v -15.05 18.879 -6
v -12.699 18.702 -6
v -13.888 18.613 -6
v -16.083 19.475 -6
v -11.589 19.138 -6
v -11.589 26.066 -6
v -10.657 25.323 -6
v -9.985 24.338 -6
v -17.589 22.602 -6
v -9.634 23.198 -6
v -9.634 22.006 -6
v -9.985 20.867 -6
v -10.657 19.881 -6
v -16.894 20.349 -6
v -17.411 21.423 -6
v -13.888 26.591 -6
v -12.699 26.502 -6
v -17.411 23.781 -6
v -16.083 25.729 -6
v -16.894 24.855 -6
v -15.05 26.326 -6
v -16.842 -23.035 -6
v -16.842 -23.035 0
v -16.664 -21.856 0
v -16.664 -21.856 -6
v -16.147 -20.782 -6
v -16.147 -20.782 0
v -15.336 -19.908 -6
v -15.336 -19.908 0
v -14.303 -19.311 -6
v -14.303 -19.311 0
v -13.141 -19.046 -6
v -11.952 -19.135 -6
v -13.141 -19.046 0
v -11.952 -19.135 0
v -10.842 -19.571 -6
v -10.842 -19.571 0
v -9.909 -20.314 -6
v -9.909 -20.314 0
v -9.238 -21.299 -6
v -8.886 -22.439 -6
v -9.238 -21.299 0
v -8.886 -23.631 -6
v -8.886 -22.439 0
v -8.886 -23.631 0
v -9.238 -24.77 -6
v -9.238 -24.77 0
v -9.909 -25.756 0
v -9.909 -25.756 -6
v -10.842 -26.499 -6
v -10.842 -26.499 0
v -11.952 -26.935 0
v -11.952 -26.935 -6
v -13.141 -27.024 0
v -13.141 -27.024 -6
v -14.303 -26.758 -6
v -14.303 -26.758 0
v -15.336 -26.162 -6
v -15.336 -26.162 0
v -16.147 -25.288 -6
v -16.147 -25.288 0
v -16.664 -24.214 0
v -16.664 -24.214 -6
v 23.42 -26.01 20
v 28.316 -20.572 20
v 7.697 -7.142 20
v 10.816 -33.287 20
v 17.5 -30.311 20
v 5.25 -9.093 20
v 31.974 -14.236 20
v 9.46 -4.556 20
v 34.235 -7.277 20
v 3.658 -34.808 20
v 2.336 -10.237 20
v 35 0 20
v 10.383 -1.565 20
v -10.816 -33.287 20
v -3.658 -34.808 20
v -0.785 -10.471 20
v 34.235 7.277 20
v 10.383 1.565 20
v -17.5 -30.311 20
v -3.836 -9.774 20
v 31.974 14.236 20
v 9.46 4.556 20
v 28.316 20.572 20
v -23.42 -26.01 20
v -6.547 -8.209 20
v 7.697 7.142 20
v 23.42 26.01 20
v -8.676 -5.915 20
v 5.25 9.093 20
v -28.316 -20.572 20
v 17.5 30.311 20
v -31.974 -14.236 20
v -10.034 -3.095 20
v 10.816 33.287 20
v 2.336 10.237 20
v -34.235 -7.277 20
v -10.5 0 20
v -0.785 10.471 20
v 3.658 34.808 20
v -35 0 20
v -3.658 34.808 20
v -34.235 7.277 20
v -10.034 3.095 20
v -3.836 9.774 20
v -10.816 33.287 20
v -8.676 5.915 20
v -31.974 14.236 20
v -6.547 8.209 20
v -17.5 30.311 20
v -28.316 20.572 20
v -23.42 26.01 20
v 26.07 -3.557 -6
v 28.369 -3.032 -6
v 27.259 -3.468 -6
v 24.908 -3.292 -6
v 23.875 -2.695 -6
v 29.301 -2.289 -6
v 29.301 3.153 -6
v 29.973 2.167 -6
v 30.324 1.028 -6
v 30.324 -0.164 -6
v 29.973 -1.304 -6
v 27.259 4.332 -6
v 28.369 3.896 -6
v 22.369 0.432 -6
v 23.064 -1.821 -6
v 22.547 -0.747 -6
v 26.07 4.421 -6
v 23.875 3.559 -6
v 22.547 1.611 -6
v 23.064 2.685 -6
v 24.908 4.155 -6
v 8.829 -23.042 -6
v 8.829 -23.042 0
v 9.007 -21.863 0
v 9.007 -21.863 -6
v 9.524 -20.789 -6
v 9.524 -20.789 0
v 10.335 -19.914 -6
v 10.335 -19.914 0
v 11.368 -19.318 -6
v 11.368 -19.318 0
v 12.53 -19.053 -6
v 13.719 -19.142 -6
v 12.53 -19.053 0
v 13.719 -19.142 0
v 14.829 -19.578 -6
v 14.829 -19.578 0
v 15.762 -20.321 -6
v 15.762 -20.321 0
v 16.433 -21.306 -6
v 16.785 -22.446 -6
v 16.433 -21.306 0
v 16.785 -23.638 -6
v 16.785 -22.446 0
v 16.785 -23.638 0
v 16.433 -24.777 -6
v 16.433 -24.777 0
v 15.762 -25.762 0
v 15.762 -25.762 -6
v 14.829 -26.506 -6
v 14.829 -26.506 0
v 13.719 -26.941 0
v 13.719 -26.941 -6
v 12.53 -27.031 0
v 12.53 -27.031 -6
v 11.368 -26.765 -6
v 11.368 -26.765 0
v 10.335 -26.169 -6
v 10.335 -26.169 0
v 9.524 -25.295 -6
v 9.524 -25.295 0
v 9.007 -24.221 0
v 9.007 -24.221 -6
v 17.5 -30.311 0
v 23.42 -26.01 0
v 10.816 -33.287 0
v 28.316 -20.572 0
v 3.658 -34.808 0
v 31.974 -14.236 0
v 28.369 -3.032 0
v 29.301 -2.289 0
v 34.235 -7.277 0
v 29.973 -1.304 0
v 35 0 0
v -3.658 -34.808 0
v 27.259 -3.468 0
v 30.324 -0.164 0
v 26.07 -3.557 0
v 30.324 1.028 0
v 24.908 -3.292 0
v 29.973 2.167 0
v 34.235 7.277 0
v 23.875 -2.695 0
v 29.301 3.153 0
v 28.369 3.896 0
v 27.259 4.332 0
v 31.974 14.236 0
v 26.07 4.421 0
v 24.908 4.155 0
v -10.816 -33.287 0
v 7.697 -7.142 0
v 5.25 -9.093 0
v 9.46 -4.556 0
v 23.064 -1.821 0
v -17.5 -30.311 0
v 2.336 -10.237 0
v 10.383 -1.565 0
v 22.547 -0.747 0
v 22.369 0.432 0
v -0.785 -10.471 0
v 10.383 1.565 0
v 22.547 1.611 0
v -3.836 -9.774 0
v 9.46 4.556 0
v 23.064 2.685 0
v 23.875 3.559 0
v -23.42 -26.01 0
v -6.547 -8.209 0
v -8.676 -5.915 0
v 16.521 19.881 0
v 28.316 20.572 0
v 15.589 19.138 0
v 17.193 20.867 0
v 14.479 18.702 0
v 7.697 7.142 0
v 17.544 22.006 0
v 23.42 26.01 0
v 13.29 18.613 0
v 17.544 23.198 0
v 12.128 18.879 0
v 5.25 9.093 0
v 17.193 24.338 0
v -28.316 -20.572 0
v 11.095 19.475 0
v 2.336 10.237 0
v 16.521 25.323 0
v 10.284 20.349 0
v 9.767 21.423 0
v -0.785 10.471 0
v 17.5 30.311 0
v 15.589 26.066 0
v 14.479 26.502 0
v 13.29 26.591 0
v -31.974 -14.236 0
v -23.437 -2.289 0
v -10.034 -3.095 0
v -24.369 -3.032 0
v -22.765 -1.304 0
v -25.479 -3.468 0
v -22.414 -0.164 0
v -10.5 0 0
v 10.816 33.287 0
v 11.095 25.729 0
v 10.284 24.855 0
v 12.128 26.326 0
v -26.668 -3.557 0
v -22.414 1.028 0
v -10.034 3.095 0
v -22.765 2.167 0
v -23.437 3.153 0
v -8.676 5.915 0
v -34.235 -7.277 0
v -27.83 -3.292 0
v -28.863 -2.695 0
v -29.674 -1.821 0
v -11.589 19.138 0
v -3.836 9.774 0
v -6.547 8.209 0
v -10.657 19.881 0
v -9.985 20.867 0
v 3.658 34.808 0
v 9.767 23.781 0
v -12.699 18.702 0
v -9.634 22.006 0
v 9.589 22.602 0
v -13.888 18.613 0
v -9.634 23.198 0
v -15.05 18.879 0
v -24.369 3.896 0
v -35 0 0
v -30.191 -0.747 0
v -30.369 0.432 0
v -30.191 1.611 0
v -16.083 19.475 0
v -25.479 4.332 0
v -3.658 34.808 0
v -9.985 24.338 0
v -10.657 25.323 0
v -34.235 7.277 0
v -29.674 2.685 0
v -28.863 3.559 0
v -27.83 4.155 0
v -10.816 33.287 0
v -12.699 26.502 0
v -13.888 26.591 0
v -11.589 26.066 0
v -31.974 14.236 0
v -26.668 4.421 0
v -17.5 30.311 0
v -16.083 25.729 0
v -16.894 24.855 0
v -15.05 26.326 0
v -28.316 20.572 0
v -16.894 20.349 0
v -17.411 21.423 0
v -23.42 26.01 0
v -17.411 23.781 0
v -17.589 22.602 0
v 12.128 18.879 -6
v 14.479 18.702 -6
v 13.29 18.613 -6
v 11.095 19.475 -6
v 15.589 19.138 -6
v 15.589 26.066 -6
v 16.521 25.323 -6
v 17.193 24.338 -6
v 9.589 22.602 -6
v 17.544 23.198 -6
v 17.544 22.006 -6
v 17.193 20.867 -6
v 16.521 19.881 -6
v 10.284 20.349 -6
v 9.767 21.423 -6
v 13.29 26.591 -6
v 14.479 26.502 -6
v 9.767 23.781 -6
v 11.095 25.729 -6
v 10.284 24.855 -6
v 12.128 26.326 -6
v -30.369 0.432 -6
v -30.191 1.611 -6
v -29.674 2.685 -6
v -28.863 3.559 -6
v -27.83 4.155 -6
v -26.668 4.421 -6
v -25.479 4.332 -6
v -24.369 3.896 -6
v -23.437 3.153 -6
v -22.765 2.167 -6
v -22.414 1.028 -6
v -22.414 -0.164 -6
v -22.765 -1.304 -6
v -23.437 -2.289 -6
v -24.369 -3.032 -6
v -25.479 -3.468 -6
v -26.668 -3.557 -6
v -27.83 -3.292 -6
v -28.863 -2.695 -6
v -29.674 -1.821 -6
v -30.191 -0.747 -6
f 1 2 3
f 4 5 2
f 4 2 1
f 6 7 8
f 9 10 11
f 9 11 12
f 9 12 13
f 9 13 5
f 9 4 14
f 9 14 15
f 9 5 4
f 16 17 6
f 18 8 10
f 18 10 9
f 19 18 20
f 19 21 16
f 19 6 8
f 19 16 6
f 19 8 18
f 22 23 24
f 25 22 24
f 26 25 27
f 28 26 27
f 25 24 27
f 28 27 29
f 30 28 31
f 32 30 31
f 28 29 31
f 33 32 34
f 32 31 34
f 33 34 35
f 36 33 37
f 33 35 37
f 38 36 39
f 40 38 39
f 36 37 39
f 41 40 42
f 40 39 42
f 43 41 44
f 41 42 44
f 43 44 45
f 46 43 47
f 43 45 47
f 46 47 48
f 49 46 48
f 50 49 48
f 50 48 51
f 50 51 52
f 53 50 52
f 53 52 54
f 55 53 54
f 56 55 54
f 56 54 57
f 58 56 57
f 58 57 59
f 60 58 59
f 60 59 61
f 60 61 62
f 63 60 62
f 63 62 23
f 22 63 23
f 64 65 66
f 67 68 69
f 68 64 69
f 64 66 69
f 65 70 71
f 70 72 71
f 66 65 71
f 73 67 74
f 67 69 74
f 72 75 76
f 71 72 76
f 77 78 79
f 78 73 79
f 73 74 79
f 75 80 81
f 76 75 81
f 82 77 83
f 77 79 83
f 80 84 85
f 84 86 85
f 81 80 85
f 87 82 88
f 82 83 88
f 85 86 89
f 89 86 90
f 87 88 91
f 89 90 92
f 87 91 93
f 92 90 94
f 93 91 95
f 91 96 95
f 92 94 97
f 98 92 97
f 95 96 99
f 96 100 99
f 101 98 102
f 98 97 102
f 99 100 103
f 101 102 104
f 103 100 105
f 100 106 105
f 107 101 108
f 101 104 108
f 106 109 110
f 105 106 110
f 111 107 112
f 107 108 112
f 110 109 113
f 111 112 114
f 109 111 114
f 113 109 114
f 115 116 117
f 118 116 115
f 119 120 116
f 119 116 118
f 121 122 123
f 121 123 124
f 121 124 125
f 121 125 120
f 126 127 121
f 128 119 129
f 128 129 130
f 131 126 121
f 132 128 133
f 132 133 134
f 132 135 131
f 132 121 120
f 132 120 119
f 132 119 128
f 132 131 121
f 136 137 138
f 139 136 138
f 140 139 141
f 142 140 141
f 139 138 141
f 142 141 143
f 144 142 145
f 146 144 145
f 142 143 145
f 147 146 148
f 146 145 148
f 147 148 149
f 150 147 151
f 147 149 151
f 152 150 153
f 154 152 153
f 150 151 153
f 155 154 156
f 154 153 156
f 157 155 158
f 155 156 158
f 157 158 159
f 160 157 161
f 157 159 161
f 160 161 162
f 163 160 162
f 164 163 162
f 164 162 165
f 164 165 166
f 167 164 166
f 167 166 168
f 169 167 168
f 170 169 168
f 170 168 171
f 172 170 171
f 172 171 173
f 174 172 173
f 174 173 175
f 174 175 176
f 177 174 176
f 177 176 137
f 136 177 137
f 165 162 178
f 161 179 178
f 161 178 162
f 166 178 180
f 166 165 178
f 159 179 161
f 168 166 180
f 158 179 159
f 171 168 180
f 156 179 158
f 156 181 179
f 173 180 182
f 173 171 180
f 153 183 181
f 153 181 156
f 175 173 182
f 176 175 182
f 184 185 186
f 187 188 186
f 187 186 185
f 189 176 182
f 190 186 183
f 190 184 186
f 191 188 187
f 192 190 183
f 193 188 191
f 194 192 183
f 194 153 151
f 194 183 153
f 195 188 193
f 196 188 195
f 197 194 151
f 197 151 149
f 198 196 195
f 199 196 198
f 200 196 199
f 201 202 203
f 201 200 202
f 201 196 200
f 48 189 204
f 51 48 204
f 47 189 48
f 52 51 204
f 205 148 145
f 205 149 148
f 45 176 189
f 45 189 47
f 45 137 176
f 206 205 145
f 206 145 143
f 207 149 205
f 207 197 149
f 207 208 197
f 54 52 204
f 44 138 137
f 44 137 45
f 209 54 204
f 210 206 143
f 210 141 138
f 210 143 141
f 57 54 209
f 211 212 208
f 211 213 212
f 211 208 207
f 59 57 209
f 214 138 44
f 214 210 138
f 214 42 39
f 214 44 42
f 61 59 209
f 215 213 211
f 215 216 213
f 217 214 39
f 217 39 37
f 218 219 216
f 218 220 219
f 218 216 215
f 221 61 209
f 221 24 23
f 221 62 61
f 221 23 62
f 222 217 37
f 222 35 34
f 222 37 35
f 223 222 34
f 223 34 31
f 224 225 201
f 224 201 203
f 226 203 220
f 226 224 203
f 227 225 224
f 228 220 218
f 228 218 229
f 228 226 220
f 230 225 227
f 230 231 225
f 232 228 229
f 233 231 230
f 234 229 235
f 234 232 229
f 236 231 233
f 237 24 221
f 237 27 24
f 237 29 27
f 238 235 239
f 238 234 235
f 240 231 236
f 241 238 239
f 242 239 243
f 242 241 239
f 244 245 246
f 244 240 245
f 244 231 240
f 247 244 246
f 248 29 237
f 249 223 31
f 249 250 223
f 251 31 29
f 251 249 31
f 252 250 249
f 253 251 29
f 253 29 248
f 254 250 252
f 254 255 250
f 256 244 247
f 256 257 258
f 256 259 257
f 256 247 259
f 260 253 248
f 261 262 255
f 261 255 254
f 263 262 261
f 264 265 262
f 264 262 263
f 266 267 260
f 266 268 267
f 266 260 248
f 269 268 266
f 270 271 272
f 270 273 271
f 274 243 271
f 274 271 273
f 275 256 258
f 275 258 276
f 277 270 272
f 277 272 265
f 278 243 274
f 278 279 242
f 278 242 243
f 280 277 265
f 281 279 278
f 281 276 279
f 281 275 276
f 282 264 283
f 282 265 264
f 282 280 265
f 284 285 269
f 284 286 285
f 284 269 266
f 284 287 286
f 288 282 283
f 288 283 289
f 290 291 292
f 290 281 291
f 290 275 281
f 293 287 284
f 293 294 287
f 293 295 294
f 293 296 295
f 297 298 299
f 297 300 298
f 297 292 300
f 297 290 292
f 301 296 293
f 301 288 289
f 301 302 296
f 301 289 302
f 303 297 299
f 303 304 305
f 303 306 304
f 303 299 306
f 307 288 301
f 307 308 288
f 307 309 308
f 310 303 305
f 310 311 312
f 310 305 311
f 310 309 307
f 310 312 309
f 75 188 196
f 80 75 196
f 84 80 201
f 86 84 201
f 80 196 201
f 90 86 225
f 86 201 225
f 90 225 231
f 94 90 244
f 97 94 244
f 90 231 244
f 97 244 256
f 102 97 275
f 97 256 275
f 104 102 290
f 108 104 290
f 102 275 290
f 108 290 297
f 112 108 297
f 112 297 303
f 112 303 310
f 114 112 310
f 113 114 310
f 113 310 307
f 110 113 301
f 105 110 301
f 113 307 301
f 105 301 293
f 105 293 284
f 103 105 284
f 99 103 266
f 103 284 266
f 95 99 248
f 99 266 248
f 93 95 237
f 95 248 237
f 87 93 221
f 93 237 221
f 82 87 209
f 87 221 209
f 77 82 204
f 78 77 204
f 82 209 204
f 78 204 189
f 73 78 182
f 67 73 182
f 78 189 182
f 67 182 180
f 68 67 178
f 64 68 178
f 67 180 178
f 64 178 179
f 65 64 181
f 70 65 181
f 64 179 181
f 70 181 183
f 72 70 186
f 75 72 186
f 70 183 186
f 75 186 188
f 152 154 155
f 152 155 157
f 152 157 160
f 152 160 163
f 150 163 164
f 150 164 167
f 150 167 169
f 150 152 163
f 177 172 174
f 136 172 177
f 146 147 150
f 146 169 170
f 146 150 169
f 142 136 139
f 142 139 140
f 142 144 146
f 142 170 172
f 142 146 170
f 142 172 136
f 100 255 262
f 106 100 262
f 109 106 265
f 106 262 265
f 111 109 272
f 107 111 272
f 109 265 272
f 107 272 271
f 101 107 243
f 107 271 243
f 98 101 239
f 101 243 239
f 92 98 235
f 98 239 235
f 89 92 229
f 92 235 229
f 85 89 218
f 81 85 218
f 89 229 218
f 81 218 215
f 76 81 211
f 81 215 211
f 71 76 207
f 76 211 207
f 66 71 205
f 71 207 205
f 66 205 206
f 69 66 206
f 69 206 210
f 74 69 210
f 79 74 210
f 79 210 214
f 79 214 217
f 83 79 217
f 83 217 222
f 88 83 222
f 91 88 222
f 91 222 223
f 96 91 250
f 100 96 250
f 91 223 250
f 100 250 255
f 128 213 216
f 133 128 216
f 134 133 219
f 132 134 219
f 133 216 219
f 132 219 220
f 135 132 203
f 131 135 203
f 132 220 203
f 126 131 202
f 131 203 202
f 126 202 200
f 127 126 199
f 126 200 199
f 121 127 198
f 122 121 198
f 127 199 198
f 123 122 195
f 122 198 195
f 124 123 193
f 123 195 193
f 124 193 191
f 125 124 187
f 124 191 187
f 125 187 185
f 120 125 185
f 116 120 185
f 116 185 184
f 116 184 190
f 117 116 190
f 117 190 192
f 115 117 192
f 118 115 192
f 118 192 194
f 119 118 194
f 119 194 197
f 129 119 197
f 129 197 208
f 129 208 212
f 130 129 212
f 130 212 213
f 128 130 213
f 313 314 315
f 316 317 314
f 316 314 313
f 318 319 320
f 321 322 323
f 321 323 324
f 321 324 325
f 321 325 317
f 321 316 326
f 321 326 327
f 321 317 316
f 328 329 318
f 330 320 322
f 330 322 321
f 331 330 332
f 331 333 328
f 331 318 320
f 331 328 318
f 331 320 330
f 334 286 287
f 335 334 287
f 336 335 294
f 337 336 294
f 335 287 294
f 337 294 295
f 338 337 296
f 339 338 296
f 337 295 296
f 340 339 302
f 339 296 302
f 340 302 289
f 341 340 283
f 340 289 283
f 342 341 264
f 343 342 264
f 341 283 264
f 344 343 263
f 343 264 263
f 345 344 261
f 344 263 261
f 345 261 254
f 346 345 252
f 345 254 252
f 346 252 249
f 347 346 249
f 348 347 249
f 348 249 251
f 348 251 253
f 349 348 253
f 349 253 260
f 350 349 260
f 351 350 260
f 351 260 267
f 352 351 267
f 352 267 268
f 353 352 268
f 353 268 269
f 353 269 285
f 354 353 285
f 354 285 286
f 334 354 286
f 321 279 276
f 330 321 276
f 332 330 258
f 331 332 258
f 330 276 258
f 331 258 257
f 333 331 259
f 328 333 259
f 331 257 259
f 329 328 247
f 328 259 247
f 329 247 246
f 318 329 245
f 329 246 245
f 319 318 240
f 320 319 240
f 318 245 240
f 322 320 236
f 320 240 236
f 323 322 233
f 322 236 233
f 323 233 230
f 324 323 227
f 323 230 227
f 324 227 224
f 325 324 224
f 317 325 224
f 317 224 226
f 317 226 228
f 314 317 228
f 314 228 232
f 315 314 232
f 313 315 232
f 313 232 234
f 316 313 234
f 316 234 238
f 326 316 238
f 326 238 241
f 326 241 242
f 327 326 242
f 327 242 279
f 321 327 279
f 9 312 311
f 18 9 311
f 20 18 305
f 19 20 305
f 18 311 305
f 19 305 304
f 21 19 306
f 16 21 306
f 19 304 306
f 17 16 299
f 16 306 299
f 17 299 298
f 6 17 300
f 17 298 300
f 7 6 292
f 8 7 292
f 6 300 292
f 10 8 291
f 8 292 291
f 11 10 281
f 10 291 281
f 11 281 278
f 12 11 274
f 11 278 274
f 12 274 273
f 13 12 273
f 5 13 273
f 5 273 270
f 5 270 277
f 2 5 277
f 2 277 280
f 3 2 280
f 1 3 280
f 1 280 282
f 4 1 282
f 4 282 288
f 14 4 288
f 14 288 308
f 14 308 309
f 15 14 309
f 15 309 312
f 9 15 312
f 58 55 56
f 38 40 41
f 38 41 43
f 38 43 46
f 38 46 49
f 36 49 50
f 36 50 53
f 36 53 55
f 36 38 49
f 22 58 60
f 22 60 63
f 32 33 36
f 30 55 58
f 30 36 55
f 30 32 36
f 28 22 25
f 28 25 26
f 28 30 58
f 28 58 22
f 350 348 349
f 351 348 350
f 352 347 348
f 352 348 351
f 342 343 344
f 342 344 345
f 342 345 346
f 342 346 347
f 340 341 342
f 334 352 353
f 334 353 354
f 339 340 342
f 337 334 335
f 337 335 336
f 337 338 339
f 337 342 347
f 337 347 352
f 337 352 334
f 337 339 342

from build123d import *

# Parameters (mm, degrees)
ESQUISSE1_R             = 35
ESQUISSE1_R_2           = 7
BOSS_EXTRU_1_DEPTH      = 20
ESQUISSE2_R             = 14
ENL_V_MAT_EXTRU_1_DEPTH = 5
ESQUISSE3_R             = 4
ENL_V_MAT_EXTRU_3_DEPTH = 5
ESQUISSE8_R             = 14
ENL_V_MAT_EXTRU_4_DEPTH = 25
BOSS_EXTRU_2_DEPTH      = 6
BOSS_EXTRU_2_DEPTH_BACK = 9
ESQUISSE9_R             = 4
ESQUISSE10_R            = 14
ESQUISSE10_R_2          = 10.5
BOSS_EXTRU_3_DEPTH      = 20


with BuildPart() as part:
    # Esquisse1 → Boss.-Extru.1 (new body)
    with BuildSketch(Plane.XY):
        Circle(ESQUISSE1_R)
        Circle(ESQUISSE1_R_2, mode=Mode.SUBTRACT)
    extrude(amount=BOSS_EXTRU_1_DEPTH)

    # Esquisse2 → Enlèv. mat.-Extru.1 (cut)
    with BuildSketch(Plane(origin=(0, 0, 0), x_dir=(-1, 0, 0), z_dir=(0, 0, -1))):
        Circle(ESQUISSE2_R)
    extrude(amount=-ENL_V_MAT_EXTRU_1_DEPTH, mode=Mode.SUBTRACT)

    # Esquisse3 → Enlèv. mat.-Extru.3 (cut)
    with BuildSketch(Plane(origin=(0, 0, 0), x_dir=(-1, 0, 0), z_dir=(0, 0, -1))):
        with Locations((-13.588993608, 22.602101614)):
            Circle(ESQUISSE3_R)
        with Locations((13.588993608, 22.602101614)):
            Circle(ESQUISSE3_R)
        with Locations((26.369096609, 0.431843358)):
            Circle(ESQUISSE3_R)
        with Locations((12.841601354, -23.034952123)):
            Circle(ESQUISSE3_R)
        with Locations((-12.82933858, -23.041784138)):
            Circle(ESQUISSE3_R)
        with Locations((-26.369096609, 0.431843358)):
            Circle(ESQUISSE3_R)
    extrude(amount=-ENL_V_MAT_EXTRU_3_DEPTH, mode=Mode.SUBTRACT)

    # Esquisse8 → Enlèv. mat.-Extru.4 (cut)
    with BuildSketch(Plane(origin=(0, 0, 0), x_dir=(-1, 0, 0), z_dir=(0, 0, -1))):
        Circle(ESQUISSE8_R)
    extrude(amount=-ENL_V_MAT_EXTRU_4_DEPTH, mode=Mode.SUBTRACT)

    # Esquisse9 → Boss.-Extru.2 (add, two sides: drawn at the far end of the back side and taken through both)
    with BuildSketch(Plane(origin=(0, 0, 0), x_dir=(-1, 0, 0), z_dir=(0, 0, -1)).offset(-BOSS_EXTRU_2_DEPTH_BACK)):
        with Locations((-13.588993608, 22.602101614)):
            Circle(ESQUISSE9_R)
        with Locations((13.588993608, 22.602101614)):
            Circle(ESQUISSE9_R)
        with Locations((26.369096609, 0.431843358)):
            Circle(ESQUISSE9_R)
        with Locations((12.841601354, -23.034952123)):
            Circle(ESQUISSE9_R)
        with Locations((-12.82933858, -23.041784138)):
            Circle(ESQUISSE9_R)
        with Locations((-26.369096609, 0.431843358)):
            Circle(ESQUISSE9_R)
    extrude(amount=BOSS_EXTRU_2_DEPTH + BOSS_EXTRU_2_DEPTH_BACK)

    # Esquisse10 → Boss.-Extru.3 (add)
    with BuildSketch(Plane(origin=(0, 0, 0), x_dir=(-1, 0, 0), z_dir=(0, 0, -1))):
        Circle(ESQUISSE10_R)
        Circle(ESQUISSE10_R_2, mode=Mode.SUBTRACT)
    extrude(amount=-BOSS_EXTRU_3_DEPTH)


solid = part.part
